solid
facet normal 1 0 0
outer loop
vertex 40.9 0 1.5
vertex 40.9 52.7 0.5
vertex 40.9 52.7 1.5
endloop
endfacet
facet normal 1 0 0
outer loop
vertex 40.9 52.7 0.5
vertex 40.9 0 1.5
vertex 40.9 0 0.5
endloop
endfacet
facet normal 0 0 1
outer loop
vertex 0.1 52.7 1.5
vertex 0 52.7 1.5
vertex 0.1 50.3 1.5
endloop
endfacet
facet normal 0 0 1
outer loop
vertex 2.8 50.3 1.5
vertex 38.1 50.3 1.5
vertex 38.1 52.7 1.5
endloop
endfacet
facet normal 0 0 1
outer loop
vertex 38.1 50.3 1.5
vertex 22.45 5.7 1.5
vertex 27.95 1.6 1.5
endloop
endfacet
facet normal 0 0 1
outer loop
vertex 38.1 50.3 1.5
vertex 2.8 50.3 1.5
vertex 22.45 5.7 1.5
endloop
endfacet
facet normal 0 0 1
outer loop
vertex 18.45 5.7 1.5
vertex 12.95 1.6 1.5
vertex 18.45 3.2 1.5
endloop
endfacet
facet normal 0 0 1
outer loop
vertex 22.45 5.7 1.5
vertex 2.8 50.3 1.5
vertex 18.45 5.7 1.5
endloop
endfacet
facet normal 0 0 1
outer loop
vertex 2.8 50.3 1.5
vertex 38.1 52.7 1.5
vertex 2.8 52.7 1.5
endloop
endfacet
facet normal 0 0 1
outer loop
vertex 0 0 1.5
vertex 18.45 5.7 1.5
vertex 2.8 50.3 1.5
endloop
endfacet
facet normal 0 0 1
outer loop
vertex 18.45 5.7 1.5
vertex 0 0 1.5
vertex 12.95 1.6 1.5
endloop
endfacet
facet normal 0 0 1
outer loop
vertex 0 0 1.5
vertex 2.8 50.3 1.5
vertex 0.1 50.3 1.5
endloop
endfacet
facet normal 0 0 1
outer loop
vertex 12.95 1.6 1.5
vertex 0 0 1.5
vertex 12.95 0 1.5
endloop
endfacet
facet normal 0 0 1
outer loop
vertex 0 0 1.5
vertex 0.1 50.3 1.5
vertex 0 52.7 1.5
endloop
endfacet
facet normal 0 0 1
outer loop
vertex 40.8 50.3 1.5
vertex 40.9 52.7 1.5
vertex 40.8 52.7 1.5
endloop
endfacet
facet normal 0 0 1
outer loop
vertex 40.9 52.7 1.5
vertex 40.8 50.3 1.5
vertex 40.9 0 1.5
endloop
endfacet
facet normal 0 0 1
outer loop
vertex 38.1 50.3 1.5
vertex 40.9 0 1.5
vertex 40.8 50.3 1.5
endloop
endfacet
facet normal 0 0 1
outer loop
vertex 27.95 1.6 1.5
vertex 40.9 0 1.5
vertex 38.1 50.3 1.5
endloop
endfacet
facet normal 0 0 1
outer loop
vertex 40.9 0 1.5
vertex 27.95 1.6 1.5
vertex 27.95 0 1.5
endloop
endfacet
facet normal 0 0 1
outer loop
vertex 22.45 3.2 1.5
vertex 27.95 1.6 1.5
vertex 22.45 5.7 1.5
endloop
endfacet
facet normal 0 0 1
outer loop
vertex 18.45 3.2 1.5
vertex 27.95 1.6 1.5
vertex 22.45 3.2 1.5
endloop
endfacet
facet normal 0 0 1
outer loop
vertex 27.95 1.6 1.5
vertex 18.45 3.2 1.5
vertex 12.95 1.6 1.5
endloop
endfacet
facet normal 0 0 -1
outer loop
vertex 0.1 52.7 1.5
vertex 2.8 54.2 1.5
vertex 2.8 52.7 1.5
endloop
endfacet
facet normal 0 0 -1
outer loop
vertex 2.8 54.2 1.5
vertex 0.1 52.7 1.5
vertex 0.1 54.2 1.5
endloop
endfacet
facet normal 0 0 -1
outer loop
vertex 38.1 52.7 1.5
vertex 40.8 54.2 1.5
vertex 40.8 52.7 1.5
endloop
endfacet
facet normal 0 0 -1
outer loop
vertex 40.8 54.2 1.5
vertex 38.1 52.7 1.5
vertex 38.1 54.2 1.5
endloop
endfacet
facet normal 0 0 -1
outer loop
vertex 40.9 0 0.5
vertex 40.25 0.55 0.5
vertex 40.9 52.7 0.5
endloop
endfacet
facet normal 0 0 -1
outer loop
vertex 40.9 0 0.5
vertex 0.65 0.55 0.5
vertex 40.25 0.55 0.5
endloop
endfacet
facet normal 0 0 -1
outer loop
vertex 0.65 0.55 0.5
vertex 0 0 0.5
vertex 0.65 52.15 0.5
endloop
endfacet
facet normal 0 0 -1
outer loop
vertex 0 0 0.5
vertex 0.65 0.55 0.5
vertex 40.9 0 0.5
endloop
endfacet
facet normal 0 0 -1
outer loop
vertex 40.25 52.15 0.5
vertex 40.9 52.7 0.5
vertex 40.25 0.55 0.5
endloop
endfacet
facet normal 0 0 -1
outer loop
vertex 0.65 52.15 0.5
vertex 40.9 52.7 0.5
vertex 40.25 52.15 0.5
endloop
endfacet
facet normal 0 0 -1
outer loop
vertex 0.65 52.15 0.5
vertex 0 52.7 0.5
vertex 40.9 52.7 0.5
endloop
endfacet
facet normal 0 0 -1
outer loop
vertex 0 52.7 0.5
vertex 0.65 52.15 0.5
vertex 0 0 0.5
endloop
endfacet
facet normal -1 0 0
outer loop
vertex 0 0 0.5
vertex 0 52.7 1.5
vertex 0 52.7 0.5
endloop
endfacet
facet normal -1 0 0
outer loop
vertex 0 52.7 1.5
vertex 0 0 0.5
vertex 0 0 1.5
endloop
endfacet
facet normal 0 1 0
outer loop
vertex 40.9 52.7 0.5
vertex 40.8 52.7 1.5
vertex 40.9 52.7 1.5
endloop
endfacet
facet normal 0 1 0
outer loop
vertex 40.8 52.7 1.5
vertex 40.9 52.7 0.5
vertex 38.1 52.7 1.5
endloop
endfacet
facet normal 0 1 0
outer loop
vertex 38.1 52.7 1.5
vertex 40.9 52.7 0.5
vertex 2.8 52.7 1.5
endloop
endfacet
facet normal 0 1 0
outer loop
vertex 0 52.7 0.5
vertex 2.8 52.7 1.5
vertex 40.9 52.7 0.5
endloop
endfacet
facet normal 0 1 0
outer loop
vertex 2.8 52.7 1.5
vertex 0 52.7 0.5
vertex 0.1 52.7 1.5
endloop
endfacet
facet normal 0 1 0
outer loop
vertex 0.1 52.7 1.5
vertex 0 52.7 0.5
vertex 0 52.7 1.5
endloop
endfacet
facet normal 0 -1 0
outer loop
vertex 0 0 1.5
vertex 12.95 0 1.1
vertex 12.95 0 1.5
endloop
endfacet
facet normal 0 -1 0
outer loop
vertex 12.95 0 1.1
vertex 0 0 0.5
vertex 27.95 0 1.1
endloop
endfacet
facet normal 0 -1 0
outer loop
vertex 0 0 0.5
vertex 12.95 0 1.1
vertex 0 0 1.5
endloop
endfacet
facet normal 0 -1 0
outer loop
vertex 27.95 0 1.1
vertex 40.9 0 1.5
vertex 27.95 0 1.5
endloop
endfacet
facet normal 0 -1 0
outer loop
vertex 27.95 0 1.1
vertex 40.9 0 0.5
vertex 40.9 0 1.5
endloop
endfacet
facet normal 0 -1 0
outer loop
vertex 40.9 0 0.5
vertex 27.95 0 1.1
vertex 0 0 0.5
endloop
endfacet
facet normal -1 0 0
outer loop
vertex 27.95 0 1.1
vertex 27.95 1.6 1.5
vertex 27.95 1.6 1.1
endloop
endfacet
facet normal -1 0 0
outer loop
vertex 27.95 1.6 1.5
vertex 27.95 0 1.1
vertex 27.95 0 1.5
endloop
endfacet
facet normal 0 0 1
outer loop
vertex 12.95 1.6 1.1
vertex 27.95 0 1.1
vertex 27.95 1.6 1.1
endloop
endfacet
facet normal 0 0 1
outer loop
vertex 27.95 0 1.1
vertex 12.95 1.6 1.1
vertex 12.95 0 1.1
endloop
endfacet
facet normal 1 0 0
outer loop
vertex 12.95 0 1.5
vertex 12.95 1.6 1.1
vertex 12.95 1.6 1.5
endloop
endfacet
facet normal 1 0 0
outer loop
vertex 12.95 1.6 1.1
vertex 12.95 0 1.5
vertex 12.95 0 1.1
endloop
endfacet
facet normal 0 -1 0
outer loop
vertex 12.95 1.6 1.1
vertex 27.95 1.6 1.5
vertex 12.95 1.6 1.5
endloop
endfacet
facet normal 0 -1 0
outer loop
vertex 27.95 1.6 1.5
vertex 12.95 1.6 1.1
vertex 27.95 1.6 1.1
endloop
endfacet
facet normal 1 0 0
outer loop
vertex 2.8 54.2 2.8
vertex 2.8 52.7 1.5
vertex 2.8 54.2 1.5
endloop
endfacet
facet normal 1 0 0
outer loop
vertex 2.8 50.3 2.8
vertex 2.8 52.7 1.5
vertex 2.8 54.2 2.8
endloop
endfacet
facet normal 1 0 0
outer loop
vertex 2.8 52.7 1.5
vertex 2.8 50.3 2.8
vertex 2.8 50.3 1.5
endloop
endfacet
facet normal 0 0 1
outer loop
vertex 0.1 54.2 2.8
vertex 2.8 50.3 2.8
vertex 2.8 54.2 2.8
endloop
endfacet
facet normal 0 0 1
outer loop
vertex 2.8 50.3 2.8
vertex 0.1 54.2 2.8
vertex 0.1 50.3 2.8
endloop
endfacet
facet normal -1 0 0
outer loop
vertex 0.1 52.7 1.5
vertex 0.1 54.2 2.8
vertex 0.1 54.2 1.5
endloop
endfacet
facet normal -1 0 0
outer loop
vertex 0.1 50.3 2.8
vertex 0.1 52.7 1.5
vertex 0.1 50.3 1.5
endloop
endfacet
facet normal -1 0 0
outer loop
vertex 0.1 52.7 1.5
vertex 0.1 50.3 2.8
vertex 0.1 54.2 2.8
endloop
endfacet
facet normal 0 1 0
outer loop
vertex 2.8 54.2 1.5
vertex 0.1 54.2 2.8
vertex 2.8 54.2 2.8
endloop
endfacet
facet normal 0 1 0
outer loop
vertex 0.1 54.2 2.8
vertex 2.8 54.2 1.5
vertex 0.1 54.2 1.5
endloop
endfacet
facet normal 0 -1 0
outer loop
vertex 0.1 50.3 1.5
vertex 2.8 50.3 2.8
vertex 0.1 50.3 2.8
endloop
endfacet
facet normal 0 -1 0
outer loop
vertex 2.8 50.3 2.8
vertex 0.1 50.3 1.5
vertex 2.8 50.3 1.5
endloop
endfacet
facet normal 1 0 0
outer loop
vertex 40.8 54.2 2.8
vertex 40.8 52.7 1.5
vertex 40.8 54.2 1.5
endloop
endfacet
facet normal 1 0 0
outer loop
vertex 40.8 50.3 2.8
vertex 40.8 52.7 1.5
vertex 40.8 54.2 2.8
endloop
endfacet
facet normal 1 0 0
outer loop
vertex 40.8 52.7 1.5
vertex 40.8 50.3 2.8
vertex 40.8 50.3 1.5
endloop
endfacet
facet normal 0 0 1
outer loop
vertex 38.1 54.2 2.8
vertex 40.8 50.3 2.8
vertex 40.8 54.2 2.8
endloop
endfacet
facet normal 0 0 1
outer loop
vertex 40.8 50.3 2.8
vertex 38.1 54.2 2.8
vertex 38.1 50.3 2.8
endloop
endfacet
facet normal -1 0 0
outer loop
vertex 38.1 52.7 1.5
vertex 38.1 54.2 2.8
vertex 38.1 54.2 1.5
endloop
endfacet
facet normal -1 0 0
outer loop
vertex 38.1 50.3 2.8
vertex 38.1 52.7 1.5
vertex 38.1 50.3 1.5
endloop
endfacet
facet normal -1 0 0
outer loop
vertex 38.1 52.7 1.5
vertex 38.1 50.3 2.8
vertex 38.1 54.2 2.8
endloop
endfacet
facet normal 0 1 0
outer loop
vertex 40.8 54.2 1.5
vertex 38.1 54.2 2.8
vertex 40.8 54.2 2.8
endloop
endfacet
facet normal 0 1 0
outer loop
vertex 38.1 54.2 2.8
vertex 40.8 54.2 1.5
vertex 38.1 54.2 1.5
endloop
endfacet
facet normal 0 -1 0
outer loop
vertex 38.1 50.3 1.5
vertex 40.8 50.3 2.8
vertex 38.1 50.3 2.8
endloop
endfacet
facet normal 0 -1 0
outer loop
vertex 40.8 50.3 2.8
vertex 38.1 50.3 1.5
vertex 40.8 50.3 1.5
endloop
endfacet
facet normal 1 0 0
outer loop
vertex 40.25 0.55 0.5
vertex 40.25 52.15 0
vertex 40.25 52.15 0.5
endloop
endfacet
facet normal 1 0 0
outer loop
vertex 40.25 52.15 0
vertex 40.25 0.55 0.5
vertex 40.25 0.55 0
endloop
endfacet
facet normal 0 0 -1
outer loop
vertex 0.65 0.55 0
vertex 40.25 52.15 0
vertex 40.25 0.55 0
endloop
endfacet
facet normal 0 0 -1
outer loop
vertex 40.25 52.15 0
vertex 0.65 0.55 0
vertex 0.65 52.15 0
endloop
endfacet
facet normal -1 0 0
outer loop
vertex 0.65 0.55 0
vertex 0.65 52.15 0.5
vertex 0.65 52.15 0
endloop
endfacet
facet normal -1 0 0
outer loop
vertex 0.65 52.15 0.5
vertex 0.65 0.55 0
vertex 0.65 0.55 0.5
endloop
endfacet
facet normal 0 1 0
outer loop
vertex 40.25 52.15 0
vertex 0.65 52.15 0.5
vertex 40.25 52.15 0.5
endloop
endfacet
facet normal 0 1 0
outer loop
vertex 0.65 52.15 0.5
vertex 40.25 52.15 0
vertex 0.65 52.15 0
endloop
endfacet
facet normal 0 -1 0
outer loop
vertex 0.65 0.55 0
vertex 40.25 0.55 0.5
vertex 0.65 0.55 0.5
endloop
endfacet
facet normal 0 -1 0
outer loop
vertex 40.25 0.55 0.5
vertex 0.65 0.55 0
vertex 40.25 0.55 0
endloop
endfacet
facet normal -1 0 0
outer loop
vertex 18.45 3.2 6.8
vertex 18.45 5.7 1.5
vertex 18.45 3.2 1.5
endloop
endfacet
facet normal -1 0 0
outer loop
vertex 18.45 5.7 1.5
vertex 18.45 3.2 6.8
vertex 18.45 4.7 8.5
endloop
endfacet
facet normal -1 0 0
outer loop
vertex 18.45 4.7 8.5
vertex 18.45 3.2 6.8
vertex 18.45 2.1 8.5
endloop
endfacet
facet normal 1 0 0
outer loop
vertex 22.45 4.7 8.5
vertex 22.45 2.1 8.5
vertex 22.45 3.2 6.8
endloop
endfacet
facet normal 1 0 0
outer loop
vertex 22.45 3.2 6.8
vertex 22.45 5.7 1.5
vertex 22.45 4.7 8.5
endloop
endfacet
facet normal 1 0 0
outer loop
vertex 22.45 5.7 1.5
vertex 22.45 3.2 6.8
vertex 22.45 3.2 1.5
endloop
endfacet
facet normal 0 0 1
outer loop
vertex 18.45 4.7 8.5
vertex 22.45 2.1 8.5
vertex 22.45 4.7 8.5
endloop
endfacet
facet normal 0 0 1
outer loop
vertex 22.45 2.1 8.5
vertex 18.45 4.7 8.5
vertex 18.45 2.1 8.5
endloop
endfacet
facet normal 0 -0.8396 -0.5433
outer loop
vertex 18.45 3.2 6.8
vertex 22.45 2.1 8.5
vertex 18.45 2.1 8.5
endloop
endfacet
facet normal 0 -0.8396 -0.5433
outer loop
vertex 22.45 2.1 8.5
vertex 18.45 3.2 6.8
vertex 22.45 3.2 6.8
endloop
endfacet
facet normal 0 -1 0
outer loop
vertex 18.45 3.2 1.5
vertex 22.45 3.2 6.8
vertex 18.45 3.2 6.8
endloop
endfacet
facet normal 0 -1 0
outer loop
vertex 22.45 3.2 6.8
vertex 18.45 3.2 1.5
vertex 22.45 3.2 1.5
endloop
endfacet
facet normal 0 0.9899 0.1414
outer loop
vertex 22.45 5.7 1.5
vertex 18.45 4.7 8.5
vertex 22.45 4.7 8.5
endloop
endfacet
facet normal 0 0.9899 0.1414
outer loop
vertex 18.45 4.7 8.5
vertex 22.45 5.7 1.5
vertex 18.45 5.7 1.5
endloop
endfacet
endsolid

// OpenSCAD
// Sharp PC-1500 / PC-1600 memory slot cover
// Parametric rebuild of the Tinkercad design "Sharp PC-1500/1600 memory slot cover 52.7mm".
// All dimensions in mm.
//
// Axes (same as in Tinkercad, ruler at the corner of the large plate):
//   X = width  (40.9 side)
//   Y = length (52.7 side); latch near Y = 0, clips at the far end
//   Z = height; print orientation, small plate on the bed
// Mounted, the cover is turned over: clips and latch go into the calculator,
// and the small plate faces outward.

/* [Large plate (top in print orientation)] */
plate_w = 40.9;
plate_l = 52.7;
plate_t = 1.0;

/* [Small plate (bottom in print orientation, centered)] */
small_w = 39.6;
small_l = 51.6;
small_t = 0.5;

/* [Clips at the far end] */
clip_w        = 2.7;   // along X
clip_l        = 3.9;   // along Y, total length
clip_t        = 1.3;   // thickness
clip_overhang = 1.5;   // how far the clips stick out past the plate edge
clip_inset    = 0.1;   // distance from the long sides of the large plate

/* [Latch] */
latch_w       = 4.0;   // along X, centered
latch_y       = 3.2;   // distance of the stem's inner face from the plate edge
stem_t        = 1.5;   // stem thickness along Y
stem_h        = 7.0;   // stem height above the large plate
slope_base    = 1.0;   // slope wedge: extra thickness at the base, tapering to 0 at the top
barb_depth    = 1.1;   // barb: how far it sticks out toward the plate edge
barb_h        = 1.7;   // barb: height of its vertical face

/* [Fingernail groove (in front of the latch)] */
groove_w = 15.0;  // along X, centered
groove_l = 1.6;   // in from the plate edge, along Y
groove_d = 0.4;   // depth below the top of the large plate

eps = 0.01;

top_z = small_t + plate_t;  // top surface of the large plate

// Small plate, centered under the large plate
translate([(plate_w - small_w) / 2, (plate_l - small_l) / 2, 0])
    cube([small_w, small_l, small_t]);

// Large plate with the fingernail groove
difference() {
    translate([0, 0, small_t])
        cube([plate_w, plate_l, plate_t]);
    translate([(plate_w - groove_w) / 2, -eps, top_z - groove_d])
        cube([groove_w, groove_l + eps, groove_d + eps]);
}

// Clips
for (x = [clip_inset, plate_w - clip_inset - clip_w])
    translate([x, plate_l + clip_overhang - clip_l, top_z])
        cube([clip_w, clip_l, clip_t]);

// Latch: stem, slope wedge and barb as one profile in the Y-Z plane,
// extruded along X. multmatrix maps (a, b, c) -> (c + x0, a, b).
latch_profile = [
    [latch_y,                       top_z],
    [latch_y + stem_t + slope_base, top_z],
    [latch_y + stem_t,              top_z + stem_h],
    [latch_y - barb_depth,          top_z + stem_h],
    [latch_y,                       top_z + stem_h - barb_h],
];
multmatrix([[0, 0, 1, (plate_w - latch_w) / 2],
            [1, 0, 0, 0],
            [0, 1, 0, 0]])
    linear_extrude(height = latch_w)
        polygon(latch_profile);
